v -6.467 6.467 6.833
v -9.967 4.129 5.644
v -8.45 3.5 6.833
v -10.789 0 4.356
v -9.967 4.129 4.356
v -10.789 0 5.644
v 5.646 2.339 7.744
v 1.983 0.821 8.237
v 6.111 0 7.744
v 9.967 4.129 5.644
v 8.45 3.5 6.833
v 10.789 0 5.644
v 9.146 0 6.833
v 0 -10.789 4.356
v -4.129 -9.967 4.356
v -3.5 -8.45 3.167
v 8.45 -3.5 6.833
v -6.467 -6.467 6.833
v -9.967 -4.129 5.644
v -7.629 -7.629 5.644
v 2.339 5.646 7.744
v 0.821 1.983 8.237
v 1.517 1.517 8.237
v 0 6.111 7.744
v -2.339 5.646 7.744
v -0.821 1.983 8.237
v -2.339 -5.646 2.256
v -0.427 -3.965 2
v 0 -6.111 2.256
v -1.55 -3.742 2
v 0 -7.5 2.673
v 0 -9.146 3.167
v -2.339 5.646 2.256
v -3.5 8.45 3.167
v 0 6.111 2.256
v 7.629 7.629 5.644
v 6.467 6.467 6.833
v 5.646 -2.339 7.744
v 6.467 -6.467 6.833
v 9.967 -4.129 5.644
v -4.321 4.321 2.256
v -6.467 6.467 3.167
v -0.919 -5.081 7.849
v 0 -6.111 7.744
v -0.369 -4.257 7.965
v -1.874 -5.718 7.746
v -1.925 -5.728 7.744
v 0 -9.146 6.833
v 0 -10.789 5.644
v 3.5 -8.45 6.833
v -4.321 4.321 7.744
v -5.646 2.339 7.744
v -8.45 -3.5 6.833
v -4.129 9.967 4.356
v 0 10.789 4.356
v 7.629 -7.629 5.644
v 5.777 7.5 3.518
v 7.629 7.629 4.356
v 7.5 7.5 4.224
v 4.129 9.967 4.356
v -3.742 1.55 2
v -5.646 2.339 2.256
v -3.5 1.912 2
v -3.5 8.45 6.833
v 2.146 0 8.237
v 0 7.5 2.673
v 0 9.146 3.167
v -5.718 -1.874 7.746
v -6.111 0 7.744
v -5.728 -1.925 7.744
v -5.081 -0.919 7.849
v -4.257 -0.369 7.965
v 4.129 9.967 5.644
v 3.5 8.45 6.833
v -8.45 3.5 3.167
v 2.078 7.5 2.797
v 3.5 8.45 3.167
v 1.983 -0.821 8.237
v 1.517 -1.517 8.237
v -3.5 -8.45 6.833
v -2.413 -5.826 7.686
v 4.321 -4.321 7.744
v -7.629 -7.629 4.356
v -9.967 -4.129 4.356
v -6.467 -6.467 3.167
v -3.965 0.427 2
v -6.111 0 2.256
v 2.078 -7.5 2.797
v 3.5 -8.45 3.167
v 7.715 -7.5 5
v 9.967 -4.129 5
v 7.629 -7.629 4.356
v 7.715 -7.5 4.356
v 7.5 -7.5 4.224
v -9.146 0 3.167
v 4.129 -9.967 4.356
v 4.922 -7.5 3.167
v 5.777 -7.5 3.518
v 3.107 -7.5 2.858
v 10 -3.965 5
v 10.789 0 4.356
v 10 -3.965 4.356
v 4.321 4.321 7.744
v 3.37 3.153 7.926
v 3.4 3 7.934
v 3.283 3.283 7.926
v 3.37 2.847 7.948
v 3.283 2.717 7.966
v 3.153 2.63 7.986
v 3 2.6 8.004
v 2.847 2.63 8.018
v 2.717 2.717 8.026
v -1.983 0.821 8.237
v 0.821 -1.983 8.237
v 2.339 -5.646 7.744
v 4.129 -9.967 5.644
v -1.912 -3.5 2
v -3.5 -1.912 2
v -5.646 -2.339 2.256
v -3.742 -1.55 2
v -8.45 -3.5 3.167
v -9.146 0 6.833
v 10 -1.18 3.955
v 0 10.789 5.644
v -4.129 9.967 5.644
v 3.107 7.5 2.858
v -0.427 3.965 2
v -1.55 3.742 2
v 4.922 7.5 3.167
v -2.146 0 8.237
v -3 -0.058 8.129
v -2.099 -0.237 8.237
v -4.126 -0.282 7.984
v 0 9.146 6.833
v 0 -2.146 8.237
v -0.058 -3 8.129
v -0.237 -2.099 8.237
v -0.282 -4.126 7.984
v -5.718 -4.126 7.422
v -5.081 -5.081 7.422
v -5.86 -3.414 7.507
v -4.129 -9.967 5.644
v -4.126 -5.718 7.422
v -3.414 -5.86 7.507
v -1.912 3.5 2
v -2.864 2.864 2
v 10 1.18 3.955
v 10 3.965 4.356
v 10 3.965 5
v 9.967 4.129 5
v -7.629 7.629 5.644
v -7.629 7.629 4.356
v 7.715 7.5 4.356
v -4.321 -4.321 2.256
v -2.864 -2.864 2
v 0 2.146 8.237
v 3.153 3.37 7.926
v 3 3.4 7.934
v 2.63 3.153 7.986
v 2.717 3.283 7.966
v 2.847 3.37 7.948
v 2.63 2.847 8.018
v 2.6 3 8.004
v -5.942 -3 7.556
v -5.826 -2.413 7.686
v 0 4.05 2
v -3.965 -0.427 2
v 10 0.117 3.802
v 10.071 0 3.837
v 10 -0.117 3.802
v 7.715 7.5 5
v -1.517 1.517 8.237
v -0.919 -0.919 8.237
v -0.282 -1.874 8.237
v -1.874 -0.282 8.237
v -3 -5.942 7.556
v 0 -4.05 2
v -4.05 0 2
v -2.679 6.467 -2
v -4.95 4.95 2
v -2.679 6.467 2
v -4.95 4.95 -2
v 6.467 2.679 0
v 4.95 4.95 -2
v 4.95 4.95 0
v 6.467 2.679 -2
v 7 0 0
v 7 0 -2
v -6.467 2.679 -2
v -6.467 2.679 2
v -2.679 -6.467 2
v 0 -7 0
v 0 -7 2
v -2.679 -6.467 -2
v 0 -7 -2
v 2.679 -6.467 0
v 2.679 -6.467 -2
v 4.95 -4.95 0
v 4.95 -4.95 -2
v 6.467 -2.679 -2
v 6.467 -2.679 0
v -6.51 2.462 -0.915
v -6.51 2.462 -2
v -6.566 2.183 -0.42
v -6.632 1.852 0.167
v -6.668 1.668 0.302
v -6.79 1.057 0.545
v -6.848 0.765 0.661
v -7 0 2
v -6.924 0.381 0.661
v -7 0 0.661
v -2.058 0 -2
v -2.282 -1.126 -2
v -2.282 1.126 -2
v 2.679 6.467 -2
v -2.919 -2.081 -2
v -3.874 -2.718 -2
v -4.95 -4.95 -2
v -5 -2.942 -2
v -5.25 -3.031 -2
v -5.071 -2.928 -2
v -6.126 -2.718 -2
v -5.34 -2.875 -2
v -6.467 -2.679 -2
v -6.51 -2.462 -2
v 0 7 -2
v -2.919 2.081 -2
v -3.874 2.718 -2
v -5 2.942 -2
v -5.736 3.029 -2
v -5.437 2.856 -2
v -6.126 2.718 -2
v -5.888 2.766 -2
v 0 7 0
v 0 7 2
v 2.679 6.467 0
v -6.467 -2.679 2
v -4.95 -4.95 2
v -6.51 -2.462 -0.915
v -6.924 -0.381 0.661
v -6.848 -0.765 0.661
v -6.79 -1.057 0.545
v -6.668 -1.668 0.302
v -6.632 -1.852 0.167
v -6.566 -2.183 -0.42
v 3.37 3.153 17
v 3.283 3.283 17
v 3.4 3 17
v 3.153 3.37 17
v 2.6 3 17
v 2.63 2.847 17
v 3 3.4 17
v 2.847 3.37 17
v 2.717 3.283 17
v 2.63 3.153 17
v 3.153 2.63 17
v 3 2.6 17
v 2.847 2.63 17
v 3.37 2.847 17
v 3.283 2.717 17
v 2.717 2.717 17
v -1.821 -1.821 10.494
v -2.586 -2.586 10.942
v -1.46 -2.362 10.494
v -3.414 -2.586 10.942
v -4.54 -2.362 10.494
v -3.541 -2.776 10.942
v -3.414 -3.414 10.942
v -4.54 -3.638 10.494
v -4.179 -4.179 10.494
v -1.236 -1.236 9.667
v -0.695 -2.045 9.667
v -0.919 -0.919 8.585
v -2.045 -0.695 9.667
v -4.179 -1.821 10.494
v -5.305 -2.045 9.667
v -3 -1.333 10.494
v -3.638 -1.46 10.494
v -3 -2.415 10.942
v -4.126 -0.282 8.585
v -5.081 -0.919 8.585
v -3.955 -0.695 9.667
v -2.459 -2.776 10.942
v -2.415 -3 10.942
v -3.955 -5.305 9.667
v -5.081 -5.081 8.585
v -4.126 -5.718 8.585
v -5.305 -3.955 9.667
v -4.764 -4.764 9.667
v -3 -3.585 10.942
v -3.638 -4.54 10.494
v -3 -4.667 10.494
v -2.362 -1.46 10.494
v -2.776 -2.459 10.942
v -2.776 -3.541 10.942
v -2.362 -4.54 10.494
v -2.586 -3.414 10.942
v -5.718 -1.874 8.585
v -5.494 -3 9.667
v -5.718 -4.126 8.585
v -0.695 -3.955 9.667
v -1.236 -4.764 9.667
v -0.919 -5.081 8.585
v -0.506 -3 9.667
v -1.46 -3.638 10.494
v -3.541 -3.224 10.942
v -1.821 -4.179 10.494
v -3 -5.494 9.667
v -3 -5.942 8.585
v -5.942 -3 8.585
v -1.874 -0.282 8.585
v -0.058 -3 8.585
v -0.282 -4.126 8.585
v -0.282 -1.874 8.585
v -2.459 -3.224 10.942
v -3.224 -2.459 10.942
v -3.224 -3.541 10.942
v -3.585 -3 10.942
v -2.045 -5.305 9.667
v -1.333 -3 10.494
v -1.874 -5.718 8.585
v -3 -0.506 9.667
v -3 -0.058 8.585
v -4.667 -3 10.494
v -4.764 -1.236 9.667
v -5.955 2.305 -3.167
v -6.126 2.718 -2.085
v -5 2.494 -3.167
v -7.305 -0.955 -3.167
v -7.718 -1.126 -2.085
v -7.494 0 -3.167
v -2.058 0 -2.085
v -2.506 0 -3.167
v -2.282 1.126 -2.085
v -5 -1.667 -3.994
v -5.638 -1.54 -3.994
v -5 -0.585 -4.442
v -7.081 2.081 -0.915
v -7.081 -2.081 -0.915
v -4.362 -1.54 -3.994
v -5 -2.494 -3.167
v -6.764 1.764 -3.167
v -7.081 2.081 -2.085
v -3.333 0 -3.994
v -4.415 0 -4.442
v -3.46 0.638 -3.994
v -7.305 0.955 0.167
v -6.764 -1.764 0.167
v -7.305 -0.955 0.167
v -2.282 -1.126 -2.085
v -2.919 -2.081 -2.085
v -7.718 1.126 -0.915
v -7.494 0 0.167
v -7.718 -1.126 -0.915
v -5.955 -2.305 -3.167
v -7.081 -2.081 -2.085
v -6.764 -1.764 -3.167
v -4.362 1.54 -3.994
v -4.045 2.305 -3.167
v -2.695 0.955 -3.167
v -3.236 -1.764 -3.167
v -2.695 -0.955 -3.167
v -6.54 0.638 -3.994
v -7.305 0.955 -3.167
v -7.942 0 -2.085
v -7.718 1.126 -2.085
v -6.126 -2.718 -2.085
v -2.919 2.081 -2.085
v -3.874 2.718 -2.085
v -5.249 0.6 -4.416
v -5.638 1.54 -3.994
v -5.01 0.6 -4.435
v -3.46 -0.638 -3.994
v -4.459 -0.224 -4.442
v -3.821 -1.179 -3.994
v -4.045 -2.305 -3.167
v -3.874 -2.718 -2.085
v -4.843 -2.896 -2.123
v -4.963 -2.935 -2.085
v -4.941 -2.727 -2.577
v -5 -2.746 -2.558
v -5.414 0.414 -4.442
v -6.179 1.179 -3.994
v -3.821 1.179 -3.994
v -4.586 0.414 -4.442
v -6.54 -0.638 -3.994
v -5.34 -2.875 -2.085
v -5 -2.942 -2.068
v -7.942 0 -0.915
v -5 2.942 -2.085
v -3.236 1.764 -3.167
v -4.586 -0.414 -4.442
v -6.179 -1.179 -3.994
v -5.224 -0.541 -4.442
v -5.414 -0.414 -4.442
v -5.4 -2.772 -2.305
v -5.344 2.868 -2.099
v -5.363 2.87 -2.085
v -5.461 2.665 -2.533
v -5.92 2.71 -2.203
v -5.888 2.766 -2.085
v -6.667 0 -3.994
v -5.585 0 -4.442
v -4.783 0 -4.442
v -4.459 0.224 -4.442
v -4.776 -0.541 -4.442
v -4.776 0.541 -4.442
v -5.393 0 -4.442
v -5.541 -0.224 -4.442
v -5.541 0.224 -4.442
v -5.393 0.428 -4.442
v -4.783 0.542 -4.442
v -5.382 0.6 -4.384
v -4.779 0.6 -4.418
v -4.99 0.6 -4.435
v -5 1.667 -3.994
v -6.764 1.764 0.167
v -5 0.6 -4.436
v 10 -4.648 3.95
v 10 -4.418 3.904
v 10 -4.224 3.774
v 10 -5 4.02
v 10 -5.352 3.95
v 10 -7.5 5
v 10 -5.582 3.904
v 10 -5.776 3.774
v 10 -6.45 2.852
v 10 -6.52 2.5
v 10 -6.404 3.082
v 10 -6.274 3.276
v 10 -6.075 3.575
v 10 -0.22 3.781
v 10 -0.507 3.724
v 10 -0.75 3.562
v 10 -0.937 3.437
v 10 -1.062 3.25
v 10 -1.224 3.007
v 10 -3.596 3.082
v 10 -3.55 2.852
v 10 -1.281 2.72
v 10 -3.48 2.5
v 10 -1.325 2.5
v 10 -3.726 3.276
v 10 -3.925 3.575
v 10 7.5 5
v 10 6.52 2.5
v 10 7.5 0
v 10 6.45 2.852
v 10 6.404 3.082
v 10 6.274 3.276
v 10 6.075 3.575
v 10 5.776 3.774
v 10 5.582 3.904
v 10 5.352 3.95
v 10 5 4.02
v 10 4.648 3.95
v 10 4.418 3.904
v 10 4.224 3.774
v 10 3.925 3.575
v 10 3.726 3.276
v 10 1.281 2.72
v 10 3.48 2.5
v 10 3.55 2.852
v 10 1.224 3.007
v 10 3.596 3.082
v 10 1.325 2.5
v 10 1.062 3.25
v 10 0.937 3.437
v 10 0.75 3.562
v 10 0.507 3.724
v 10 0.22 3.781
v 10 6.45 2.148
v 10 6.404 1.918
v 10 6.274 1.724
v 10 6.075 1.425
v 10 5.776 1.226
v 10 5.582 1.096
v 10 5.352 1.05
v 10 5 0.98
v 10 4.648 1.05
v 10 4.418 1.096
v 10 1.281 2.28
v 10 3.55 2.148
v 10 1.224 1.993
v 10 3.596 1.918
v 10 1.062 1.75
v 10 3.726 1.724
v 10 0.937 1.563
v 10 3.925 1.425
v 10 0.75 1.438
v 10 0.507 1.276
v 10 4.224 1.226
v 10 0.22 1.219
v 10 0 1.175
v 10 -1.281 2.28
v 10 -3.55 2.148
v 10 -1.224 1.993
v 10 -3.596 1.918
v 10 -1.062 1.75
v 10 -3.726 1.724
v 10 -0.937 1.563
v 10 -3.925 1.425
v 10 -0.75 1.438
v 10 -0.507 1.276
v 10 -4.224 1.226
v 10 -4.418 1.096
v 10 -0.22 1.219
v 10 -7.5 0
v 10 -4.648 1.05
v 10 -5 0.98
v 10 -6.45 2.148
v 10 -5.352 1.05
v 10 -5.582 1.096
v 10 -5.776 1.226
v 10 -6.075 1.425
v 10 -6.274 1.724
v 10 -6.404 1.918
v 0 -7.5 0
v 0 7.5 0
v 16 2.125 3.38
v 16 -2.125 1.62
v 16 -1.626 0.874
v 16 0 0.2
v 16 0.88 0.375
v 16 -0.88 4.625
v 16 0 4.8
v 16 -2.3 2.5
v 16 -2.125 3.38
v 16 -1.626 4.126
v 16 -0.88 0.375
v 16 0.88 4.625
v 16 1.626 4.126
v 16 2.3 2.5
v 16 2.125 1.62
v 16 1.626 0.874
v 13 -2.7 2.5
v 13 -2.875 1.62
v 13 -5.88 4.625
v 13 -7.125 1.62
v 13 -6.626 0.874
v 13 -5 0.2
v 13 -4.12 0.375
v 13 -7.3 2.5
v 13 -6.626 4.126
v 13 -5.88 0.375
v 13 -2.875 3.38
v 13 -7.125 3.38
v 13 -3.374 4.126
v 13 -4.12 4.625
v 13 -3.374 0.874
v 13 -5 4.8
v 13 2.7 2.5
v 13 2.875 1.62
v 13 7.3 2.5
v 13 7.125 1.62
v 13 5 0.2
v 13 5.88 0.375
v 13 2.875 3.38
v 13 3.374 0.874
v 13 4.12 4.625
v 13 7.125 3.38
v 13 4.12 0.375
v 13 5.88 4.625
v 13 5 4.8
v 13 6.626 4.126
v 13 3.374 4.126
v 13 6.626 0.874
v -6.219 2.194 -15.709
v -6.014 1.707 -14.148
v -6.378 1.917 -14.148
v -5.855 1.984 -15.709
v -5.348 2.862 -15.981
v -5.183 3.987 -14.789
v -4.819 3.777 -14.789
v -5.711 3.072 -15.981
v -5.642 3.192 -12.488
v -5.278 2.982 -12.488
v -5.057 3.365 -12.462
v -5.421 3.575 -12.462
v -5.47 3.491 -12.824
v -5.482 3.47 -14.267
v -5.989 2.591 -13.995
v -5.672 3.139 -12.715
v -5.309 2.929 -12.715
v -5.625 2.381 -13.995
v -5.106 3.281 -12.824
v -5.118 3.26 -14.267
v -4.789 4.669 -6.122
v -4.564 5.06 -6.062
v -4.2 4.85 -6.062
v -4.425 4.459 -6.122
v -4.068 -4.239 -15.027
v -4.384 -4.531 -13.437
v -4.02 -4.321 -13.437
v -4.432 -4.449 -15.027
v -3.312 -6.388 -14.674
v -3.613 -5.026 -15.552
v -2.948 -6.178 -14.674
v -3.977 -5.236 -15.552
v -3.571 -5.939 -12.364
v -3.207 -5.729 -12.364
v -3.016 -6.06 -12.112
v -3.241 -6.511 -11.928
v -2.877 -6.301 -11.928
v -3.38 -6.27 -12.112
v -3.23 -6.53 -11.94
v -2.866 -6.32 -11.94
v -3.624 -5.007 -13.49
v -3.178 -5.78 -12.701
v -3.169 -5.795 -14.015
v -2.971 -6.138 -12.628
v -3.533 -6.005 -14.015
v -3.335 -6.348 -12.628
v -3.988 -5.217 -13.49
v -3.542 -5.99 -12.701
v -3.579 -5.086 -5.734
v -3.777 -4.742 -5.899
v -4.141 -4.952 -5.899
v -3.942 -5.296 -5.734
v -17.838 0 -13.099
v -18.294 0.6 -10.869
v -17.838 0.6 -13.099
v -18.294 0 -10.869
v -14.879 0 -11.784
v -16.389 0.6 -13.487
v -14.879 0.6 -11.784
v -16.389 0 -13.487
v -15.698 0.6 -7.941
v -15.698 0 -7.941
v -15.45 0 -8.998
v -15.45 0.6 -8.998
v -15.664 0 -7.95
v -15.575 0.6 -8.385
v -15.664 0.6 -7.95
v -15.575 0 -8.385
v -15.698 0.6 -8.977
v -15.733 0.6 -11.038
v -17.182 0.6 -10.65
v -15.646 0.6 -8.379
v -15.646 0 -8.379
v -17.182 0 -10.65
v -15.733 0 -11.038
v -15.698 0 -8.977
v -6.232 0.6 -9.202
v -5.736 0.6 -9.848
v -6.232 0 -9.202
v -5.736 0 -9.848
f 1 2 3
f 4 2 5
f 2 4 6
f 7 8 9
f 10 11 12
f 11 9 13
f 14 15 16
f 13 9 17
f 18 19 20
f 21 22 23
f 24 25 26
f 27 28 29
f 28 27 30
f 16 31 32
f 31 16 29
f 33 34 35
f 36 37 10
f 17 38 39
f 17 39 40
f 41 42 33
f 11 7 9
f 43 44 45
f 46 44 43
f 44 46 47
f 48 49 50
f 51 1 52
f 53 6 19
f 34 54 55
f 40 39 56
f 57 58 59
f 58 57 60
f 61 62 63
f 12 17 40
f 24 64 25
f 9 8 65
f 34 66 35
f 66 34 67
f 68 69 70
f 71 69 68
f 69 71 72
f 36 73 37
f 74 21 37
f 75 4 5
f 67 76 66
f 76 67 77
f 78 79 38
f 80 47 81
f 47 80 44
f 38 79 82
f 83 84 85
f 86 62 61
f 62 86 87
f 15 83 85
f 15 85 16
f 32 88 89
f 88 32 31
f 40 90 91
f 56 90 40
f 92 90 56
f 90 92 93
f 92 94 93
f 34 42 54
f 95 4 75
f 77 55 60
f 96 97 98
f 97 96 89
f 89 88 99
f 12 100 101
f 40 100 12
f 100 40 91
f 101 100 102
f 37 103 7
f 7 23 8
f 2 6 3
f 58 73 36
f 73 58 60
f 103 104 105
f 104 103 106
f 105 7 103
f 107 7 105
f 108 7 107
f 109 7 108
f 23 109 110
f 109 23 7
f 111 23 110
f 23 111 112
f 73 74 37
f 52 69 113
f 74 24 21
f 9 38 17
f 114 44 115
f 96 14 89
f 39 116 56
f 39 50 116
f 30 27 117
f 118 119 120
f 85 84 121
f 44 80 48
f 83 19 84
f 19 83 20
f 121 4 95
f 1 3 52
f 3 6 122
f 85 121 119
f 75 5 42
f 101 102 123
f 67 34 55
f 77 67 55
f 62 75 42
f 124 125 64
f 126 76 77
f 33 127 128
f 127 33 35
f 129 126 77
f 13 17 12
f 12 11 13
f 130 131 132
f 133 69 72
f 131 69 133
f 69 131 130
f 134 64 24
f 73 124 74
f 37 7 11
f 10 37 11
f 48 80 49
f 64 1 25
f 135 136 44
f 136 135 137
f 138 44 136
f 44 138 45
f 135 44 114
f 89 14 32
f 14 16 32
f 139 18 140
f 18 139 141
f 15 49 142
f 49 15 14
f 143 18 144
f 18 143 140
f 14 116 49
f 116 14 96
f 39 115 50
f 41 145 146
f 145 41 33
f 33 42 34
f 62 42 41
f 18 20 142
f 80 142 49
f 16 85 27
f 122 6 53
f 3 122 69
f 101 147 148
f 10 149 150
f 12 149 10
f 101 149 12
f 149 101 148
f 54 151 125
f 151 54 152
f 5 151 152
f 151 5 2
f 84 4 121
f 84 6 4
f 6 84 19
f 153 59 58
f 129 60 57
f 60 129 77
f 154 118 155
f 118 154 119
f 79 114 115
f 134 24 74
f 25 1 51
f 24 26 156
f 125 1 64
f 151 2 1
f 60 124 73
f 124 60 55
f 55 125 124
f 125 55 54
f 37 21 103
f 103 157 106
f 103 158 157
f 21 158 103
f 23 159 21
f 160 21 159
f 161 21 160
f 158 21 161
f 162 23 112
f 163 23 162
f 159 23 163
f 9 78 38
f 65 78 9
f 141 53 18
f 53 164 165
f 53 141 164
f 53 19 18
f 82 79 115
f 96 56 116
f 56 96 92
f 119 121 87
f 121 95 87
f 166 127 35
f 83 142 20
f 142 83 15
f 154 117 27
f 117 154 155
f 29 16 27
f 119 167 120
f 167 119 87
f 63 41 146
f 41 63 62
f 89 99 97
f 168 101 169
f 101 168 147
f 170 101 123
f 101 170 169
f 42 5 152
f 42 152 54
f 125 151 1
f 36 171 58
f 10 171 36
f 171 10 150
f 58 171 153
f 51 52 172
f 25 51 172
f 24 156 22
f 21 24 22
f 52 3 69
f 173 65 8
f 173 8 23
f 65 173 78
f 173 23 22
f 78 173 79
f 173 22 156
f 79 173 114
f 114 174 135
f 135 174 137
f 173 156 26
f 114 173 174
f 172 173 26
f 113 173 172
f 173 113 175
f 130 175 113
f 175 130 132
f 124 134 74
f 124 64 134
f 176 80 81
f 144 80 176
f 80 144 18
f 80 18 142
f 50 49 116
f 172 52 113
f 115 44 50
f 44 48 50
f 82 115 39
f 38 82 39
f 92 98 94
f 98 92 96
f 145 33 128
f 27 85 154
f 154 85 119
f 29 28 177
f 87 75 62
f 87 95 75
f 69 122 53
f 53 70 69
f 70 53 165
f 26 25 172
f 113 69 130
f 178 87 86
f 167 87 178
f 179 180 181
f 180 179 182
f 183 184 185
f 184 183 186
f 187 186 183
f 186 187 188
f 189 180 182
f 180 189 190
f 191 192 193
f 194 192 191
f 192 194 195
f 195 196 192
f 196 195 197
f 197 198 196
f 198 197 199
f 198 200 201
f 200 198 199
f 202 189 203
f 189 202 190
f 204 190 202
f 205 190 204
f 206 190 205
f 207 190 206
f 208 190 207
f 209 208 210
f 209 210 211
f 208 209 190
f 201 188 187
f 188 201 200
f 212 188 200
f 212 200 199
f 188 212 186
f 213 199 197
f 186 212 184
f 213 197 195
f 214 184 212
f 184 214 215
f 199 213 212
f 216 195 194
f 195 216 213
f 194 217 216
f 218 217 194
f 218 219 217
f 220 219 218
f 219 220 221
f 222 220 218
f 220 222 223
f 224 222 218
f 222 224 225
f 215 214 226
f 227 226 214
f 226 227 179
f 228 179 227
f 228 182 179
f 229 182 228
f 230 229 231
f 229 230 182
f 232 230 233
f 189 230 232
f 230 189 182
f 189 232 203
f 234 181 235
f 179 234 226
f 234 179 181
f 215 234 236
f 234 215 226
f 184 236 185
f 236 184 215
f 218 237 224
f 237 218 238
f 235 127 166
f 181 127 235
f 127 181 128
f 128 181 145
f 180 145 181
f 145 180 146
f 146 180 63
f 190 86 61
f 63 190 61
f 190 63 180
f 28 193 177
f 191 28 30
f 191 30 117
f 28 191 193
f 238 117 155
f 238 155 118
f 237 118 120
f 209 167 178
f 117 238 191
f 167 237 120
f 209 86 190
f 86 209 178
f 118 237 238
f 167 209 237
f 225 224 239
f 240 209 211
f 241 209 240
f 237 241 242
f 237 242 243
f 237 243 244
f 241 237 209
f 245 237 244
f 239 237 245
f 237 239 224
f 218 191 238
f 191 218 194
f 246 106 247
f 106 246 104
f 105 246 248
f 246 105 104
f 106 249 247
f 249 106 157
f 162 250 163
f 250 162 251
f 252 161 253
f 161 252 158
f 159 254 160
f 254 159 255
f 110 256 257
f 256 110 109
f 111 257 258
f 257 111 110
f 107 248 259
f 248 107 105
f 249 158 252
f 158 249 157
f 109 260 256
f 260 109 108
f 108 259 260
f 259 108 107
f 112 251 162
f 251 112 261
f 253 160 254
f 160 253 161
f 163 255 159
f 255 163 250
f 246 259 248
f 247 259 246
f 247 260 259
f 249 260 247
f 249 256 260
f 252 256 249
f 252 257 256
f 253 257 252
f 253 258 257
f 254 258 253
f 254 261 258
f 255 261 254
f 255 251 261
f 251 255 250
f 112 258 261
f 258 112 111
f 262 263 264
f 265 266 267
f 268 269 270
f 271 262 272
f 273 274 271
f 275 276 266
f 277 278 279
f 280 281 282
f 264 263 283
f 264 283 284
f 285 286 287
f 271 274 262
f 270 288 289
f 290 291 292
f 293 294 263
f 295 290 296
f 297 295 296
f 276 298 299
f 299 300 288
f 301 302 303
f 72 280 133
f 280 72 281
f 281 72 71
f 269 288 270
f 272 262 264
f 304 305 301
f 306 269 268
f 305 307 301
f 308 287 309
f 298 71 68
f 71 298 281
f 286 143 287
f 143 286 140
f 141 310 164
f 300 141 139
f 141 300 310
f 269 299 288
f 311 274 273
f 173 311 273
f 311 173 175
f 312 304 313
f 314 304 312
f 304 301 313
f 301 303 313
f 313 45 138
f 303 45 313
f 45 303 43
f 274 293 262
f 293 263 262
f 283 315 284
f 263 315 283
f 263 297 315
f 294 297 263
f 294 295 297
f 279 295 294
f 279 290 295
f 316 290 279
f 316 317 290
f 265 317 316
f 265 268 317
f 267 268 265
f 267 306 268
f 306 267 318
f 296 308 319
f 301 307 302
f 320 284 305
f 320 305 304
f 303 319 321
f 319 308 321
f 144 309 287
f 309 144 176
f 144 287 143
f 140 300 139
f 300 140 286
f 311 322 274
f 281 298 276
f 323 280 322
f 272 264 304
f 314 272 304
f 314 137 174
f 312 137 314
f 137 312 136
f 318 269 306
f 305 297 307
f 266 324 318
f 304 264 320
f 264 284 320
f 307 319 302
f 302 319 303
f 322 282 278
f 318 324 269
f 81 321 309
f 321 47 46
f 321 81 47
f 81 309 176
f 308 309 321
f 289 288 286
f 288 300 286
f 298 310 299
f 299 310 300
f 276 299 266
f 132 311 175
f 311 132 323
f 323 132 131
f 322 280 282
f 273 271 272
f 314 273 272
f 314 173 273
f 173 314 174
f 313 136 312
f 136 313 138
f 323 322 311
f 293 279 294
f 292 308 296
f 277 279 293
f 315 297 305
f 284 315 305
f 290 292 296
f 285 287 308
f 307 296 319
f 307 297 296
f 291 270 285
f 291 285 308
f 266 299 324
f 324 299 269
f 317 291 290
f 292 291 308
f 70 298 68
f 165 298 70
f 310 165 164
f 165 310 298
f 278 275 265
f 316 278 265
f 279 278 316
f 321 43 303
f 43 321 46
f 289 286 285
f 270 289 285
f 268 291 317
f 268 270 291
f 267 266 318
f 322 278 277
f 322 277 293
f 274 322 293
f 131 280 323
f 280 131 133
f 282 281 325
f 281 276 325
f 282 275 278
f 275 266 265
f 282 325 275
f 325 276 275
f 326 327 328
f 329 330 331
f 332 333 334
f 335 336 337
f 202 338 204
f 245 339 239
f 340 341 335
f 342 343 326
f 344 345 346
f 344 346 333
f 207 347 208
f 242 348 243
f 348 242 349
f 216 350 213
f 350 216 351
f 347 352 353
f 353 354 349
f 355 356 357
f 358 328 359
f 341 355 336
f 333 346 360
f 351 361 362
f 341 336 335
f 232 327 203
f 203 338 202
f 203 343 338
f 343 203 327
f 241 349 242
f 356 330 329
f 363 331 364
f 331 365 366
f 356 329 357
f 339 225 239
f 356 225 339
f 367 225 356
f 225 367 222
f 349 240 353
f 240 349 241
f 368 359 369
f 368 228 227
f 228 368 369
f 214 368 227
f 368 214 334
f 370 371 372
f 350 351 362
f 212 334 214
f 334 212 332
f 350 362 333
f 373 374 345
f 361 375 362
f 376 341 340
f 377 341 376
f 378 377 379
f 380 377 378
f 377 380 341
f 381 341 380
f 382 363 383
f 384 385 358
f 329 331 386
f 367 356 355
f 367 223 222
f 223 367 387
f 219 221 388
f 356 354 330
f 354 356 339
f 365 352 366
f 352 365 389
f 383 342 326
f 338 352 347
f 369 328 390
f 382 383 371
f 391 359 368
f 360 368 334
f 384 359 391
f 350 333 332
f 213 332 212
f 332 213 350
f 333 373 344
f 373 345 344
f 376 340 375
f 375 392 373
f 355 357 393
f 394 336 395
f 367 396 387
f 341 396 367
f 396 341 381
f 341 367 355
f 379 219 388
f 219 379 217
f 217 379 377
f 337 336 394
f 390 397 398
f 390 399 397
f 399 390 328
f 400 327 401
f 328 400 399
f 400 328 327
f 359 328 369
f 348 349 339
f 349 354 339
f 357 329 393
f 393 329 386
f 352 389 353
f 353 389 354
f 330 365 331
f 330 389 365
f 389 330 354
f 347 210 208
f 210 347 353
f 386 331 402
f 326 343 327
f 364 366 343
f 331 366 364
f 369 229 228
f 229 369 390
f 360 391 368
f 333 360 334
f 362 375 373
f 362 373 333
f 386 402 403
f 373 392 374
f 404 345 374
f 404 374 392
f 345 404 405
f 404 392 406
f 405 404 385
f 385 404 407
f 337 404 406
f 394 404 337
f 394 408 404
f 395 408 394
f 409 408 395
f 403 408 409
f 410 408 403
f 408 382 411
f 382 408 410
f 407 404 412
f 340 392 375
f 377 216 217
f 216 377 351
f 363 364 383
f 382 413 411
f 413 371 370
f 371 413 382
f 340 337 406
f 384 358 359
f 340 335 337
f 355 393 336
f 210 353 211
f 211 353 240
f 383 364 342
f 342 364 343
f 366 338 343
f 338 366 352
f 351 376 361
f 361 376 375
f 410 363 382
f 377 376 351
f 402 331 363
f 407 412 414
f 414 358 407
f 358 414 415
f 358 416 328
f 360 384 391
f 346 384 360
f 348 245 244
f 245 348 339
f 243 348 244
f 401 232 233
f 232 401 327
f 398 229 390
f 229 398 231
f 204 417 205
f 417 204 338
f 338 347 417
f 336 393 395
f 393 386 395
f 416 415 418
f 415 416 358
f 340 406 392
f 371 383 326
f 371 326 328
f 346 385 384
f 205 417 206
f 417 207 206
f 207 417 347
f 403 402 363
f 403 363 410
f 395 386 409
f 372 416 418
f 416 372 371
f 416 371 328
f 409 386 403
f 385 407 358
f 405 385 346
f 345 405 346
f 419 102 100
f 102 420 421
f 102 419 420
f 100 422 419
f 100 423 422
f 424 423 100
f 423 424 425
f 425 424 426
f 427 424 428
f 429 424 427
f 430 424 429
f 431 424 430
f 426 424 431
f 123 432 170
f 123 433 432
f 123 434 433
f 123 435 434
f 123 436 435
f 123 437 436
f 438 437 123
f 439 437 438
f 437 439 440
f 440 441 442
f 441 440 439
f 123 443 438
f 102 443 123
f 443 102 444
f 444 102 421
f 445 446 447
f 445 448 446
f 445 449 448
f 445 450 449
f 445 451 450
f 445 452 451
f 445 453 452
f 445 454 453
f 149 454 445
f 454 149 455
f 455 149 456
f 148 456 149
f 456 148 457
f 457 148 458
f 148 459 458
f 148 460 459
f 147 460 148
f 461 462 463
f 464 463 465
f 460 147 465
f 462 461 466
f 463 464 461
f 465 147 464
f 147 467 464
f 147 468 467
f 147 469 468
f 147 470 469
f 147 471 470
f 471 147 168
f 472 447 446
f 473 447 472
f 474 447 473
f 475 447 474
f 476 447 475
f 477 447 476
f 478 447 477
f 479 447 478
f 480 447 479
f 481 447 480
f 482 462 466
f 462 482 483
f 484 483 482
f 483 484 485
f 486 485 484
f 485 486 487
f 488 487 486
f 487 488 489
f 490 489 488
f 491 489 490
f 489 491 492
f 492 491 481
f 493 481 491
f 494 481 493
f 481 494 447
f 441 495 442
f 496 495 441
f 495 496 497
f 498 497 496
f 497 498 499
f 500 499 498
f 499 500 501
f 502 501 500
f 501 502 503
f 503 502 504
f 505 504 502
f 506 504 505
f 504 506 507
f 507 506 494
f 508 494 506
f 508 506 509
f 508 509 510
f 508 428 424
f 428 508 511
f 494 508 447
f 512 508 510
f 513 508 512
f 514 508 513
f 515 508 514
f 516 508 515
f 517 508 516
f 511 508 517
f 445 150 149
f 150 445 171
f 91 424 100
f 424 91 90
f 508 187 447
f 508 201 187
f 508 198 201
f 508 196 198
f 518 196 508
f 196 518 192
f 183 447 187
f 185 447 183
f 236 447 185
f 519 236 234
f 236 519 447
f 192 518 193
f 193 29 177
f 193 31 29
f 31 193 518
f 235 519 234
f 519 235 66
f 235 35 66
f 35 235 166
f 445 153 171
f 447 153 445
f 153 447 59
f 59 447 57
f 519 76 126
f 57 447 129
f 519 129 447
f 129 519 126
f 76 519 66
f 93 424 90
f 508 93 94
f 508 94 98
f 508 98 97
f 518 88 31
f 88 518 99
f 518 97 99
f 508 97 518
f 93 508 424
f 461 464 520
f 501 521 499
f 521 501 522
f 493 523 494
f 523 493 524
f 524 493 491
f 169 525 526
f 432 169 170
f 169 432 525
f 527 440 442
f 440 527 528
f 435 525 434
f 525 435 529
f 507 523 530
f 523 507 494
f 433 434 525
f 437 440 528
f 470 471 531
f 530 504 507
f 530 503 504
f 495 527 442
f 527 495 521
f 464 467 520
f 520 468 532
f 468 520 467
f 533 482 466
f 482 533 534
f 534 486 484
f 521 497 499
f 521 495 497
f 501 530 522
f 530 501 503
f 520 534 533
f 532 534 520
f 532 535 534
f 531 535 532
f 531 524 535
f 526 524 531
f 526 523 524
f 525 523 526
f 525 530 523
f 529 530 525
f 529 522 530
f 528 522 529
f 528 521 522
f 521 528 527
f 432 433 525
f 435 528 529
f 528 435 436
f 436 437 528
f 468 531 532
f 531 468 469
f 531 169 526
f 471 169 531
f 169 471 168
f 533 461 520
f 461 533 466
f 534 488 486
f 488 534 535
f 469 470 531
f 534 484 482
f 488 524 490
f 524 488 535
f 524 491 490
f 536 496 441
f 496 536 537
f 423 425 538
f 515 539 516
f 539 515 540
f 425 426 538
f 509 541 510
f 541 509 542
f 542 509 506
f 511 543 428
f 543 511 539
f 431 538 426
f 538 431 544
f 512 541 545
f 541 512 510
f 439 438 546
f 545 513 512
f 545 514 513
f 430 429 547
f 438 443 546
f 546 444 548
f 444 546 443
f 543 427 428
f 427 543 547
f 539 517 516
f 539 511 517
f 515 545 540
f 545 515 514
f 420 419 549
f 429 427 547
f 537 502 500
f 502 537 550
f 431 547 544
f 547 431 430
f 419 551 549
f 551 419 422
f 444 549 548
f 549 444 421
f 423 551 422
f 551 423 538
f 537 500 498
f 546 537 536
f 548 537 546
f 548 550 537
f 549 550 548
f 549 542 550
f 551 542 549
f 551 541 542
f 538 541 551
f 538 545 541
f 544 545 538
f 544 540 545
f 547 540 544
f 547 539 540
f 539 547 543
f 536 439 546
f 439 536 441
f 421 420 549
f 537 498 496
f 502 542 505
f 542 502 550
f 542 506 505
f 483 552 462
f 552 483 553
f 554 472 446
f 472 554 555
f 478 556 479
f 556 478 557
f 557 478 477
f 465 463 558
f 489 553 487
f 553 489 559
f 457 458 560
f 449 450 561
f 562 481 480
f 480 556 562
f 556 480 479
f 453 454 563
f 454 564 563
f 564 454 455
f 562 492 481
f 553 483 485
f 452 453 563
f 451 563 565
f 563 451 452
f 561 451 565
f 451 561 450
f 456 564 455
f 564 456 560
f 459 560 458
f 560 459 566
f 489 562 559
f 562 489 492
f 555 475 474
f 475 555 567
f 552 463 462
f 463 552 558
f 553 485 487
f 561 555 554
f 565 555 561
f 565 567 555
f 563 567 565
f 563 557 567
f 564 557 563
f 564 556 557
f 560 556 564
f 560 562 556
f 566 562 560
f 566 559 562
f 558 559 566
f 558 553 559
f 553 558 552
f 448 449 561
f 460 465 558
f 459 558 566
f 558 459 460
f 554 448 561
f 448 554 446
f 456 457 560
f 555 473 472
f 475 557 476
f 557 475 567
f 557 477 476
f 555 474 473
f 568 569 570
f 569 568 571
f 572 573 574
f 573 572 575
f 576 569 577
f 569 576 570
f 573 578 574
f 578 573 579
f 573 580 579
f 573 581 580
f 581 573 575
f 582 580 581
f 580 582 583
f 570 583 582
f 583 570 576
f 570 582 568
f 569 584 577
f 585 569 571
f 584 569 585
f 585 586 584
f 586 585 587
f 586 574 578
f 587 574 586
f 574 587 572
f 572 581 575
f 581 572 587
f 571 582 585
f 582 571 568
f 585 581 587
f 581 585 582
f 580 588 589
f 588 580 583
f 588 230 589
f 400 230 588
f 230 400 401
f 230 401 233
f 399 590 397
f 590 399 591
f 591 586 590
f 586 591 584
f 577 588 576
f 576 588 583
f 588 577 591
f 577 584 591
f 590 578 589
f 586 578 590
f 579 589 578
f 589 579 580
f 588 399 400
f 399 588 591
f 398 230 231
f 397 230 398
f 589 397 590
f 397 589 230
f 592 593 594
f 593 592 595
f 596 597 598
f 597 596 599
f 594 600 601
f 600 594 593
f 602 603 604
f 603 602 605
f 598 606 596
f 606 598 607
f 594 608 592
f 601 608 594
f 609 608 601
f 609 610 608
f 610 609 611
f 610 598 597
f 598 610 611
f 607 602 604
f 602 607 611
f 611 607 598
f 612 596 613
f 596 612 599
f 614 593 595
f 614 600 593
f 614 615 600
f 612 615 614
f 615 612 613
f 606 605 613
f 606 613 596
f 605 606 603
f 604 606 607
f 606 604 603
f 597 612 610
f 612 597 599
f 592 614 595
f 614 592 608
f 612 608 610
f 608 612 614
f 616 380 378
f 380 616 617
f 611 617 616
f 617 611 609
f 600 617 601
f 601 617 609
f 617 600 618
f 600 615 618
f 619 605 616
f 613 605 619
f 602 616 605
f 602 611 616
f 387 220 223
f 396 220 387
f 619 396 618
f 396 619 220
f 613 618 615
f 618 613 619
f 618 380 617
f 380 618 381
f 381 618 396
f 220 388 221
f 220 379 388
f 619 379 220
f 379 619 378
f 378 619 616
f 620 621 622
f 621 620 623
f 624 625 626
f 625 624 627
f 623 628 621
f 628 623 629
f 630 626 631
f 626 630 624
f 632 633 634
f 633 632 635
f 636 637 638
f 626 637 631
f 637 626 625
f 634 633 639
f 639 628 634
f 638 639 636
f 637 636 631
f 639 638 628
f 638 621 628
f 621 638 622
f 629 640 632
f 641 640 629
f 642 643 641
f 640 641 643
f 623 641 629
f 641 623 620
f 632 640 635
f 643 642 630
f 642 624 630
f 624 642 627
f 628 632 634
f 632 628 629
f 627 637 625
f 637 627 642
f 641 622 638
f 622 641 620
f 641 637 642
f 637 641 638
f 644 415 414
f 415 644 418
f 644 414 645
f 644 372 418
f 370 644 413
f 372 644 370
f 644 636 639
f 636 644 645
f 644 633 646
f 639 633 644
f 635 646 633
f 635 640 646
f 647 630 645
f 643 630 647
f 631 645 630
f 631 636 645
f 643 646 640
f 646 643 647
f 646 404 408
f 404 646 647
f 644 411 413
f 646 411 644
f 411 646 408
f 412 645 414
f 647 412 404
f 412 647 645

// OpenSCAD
$fn=16; 

module gripper()
{
	translate(v = [2.5, 0.3, -0.25])
		difference() {
			scale(v = [1, 1, 0.5])
				rotate(a = 45, v = [0, 1, 0])
					cube(size = [5, 0.6, 5], center = true);
			translate(v = [-6, 0, 0])
				cube(size = [5, 5, 5], center = true);
			translate(v = [2, 0, 0])
				cube(size = [5, 1.5, 1.5], center = true);
		}
}

module leg(angle)
{
	rotate(a = 180, v = [0, 1, ])
	union() {
		cube(size = [0.6, 0.6, 10], center = false);
		translate(v = [0, 0, 10]) {
			rotate(a = angle, v = [0, 1, 0])
				cube(size = [0.6, 0.6, 10], center = false);
			translate(v = [cos(90 - angle) * 10, 0, sin(90 - angle) * 10])
				rotate(a = -angle, v = [0, 1, 0])
					gripper();
		}
	}
}

module legset()
{
	scale(v = [0.7, 0.7, 0.7])
	rotate(a = 60, v = [0, 0, 1])
		translate(v = [3, 0, 0])
		rotate(a = -30, v = [0, 1, 0])
			leg(45);
	scale(v = [0.7, 0.7, 0.7])
	rotate(a = -60, v = [0, 0, 1])
		translate(v = [3, 0, 0])
		rotate(a = -35, v = [0, 1, 0])
			leg(25);
	rotate(a = 0, v = [0, 0, 1])
		translate(v = [3, 0, 0])
		rotate(a = 10, v = [0, 1, 0])
			leg(85);
}

module main_body()
{
	$fn = 8;
	union() {
		difference() {
			translate(v = [0, 0, 5])
				scale(v = [1, 1, 0.3])
				sphere(r = 11);
			translate(v = [0, 0, -10.1])
				cube(size = [20, 20, 20], center = true);
		}
		cylinder(h = 4, r1 = 7, r2 = 7, center = true);
		translate(v = [3, 3, 2])
			cylinder(h = 15, r1 = 0.4, r2 = 0.4);
		translate(v = [-3, -3, 8])
			sphere(r = 3);
		translate(v = [-5, 0, -1.5])
			sphere(r = 3);
		translate(v = [5, 0, 2.5])
			cube(size = [10, 15, 5], center = true);
		translate(v = [8, 0, 2.5])
		rotate(a = 90, v = [0, 1, 0]) 
			cylinder(h = 8, r1 = 1, r2 = 2.3);
		translate(v = [8, -5, 2.5])
		rotate(a = 90, v = [0, 1, 0]) 
			cylinder(h = 5, r1 = 1, r2 = 2.3);
		translate(v = [8, 5, 2.5])
		rotate(a = 90, v = [0, 1, 0]) 
			cylinder(h = 5, r1 = 1, r2 = 2.3);
	}
	$fn = 16;
}

main_body();
translate(v = [-7, 0, 0])
	legset();
